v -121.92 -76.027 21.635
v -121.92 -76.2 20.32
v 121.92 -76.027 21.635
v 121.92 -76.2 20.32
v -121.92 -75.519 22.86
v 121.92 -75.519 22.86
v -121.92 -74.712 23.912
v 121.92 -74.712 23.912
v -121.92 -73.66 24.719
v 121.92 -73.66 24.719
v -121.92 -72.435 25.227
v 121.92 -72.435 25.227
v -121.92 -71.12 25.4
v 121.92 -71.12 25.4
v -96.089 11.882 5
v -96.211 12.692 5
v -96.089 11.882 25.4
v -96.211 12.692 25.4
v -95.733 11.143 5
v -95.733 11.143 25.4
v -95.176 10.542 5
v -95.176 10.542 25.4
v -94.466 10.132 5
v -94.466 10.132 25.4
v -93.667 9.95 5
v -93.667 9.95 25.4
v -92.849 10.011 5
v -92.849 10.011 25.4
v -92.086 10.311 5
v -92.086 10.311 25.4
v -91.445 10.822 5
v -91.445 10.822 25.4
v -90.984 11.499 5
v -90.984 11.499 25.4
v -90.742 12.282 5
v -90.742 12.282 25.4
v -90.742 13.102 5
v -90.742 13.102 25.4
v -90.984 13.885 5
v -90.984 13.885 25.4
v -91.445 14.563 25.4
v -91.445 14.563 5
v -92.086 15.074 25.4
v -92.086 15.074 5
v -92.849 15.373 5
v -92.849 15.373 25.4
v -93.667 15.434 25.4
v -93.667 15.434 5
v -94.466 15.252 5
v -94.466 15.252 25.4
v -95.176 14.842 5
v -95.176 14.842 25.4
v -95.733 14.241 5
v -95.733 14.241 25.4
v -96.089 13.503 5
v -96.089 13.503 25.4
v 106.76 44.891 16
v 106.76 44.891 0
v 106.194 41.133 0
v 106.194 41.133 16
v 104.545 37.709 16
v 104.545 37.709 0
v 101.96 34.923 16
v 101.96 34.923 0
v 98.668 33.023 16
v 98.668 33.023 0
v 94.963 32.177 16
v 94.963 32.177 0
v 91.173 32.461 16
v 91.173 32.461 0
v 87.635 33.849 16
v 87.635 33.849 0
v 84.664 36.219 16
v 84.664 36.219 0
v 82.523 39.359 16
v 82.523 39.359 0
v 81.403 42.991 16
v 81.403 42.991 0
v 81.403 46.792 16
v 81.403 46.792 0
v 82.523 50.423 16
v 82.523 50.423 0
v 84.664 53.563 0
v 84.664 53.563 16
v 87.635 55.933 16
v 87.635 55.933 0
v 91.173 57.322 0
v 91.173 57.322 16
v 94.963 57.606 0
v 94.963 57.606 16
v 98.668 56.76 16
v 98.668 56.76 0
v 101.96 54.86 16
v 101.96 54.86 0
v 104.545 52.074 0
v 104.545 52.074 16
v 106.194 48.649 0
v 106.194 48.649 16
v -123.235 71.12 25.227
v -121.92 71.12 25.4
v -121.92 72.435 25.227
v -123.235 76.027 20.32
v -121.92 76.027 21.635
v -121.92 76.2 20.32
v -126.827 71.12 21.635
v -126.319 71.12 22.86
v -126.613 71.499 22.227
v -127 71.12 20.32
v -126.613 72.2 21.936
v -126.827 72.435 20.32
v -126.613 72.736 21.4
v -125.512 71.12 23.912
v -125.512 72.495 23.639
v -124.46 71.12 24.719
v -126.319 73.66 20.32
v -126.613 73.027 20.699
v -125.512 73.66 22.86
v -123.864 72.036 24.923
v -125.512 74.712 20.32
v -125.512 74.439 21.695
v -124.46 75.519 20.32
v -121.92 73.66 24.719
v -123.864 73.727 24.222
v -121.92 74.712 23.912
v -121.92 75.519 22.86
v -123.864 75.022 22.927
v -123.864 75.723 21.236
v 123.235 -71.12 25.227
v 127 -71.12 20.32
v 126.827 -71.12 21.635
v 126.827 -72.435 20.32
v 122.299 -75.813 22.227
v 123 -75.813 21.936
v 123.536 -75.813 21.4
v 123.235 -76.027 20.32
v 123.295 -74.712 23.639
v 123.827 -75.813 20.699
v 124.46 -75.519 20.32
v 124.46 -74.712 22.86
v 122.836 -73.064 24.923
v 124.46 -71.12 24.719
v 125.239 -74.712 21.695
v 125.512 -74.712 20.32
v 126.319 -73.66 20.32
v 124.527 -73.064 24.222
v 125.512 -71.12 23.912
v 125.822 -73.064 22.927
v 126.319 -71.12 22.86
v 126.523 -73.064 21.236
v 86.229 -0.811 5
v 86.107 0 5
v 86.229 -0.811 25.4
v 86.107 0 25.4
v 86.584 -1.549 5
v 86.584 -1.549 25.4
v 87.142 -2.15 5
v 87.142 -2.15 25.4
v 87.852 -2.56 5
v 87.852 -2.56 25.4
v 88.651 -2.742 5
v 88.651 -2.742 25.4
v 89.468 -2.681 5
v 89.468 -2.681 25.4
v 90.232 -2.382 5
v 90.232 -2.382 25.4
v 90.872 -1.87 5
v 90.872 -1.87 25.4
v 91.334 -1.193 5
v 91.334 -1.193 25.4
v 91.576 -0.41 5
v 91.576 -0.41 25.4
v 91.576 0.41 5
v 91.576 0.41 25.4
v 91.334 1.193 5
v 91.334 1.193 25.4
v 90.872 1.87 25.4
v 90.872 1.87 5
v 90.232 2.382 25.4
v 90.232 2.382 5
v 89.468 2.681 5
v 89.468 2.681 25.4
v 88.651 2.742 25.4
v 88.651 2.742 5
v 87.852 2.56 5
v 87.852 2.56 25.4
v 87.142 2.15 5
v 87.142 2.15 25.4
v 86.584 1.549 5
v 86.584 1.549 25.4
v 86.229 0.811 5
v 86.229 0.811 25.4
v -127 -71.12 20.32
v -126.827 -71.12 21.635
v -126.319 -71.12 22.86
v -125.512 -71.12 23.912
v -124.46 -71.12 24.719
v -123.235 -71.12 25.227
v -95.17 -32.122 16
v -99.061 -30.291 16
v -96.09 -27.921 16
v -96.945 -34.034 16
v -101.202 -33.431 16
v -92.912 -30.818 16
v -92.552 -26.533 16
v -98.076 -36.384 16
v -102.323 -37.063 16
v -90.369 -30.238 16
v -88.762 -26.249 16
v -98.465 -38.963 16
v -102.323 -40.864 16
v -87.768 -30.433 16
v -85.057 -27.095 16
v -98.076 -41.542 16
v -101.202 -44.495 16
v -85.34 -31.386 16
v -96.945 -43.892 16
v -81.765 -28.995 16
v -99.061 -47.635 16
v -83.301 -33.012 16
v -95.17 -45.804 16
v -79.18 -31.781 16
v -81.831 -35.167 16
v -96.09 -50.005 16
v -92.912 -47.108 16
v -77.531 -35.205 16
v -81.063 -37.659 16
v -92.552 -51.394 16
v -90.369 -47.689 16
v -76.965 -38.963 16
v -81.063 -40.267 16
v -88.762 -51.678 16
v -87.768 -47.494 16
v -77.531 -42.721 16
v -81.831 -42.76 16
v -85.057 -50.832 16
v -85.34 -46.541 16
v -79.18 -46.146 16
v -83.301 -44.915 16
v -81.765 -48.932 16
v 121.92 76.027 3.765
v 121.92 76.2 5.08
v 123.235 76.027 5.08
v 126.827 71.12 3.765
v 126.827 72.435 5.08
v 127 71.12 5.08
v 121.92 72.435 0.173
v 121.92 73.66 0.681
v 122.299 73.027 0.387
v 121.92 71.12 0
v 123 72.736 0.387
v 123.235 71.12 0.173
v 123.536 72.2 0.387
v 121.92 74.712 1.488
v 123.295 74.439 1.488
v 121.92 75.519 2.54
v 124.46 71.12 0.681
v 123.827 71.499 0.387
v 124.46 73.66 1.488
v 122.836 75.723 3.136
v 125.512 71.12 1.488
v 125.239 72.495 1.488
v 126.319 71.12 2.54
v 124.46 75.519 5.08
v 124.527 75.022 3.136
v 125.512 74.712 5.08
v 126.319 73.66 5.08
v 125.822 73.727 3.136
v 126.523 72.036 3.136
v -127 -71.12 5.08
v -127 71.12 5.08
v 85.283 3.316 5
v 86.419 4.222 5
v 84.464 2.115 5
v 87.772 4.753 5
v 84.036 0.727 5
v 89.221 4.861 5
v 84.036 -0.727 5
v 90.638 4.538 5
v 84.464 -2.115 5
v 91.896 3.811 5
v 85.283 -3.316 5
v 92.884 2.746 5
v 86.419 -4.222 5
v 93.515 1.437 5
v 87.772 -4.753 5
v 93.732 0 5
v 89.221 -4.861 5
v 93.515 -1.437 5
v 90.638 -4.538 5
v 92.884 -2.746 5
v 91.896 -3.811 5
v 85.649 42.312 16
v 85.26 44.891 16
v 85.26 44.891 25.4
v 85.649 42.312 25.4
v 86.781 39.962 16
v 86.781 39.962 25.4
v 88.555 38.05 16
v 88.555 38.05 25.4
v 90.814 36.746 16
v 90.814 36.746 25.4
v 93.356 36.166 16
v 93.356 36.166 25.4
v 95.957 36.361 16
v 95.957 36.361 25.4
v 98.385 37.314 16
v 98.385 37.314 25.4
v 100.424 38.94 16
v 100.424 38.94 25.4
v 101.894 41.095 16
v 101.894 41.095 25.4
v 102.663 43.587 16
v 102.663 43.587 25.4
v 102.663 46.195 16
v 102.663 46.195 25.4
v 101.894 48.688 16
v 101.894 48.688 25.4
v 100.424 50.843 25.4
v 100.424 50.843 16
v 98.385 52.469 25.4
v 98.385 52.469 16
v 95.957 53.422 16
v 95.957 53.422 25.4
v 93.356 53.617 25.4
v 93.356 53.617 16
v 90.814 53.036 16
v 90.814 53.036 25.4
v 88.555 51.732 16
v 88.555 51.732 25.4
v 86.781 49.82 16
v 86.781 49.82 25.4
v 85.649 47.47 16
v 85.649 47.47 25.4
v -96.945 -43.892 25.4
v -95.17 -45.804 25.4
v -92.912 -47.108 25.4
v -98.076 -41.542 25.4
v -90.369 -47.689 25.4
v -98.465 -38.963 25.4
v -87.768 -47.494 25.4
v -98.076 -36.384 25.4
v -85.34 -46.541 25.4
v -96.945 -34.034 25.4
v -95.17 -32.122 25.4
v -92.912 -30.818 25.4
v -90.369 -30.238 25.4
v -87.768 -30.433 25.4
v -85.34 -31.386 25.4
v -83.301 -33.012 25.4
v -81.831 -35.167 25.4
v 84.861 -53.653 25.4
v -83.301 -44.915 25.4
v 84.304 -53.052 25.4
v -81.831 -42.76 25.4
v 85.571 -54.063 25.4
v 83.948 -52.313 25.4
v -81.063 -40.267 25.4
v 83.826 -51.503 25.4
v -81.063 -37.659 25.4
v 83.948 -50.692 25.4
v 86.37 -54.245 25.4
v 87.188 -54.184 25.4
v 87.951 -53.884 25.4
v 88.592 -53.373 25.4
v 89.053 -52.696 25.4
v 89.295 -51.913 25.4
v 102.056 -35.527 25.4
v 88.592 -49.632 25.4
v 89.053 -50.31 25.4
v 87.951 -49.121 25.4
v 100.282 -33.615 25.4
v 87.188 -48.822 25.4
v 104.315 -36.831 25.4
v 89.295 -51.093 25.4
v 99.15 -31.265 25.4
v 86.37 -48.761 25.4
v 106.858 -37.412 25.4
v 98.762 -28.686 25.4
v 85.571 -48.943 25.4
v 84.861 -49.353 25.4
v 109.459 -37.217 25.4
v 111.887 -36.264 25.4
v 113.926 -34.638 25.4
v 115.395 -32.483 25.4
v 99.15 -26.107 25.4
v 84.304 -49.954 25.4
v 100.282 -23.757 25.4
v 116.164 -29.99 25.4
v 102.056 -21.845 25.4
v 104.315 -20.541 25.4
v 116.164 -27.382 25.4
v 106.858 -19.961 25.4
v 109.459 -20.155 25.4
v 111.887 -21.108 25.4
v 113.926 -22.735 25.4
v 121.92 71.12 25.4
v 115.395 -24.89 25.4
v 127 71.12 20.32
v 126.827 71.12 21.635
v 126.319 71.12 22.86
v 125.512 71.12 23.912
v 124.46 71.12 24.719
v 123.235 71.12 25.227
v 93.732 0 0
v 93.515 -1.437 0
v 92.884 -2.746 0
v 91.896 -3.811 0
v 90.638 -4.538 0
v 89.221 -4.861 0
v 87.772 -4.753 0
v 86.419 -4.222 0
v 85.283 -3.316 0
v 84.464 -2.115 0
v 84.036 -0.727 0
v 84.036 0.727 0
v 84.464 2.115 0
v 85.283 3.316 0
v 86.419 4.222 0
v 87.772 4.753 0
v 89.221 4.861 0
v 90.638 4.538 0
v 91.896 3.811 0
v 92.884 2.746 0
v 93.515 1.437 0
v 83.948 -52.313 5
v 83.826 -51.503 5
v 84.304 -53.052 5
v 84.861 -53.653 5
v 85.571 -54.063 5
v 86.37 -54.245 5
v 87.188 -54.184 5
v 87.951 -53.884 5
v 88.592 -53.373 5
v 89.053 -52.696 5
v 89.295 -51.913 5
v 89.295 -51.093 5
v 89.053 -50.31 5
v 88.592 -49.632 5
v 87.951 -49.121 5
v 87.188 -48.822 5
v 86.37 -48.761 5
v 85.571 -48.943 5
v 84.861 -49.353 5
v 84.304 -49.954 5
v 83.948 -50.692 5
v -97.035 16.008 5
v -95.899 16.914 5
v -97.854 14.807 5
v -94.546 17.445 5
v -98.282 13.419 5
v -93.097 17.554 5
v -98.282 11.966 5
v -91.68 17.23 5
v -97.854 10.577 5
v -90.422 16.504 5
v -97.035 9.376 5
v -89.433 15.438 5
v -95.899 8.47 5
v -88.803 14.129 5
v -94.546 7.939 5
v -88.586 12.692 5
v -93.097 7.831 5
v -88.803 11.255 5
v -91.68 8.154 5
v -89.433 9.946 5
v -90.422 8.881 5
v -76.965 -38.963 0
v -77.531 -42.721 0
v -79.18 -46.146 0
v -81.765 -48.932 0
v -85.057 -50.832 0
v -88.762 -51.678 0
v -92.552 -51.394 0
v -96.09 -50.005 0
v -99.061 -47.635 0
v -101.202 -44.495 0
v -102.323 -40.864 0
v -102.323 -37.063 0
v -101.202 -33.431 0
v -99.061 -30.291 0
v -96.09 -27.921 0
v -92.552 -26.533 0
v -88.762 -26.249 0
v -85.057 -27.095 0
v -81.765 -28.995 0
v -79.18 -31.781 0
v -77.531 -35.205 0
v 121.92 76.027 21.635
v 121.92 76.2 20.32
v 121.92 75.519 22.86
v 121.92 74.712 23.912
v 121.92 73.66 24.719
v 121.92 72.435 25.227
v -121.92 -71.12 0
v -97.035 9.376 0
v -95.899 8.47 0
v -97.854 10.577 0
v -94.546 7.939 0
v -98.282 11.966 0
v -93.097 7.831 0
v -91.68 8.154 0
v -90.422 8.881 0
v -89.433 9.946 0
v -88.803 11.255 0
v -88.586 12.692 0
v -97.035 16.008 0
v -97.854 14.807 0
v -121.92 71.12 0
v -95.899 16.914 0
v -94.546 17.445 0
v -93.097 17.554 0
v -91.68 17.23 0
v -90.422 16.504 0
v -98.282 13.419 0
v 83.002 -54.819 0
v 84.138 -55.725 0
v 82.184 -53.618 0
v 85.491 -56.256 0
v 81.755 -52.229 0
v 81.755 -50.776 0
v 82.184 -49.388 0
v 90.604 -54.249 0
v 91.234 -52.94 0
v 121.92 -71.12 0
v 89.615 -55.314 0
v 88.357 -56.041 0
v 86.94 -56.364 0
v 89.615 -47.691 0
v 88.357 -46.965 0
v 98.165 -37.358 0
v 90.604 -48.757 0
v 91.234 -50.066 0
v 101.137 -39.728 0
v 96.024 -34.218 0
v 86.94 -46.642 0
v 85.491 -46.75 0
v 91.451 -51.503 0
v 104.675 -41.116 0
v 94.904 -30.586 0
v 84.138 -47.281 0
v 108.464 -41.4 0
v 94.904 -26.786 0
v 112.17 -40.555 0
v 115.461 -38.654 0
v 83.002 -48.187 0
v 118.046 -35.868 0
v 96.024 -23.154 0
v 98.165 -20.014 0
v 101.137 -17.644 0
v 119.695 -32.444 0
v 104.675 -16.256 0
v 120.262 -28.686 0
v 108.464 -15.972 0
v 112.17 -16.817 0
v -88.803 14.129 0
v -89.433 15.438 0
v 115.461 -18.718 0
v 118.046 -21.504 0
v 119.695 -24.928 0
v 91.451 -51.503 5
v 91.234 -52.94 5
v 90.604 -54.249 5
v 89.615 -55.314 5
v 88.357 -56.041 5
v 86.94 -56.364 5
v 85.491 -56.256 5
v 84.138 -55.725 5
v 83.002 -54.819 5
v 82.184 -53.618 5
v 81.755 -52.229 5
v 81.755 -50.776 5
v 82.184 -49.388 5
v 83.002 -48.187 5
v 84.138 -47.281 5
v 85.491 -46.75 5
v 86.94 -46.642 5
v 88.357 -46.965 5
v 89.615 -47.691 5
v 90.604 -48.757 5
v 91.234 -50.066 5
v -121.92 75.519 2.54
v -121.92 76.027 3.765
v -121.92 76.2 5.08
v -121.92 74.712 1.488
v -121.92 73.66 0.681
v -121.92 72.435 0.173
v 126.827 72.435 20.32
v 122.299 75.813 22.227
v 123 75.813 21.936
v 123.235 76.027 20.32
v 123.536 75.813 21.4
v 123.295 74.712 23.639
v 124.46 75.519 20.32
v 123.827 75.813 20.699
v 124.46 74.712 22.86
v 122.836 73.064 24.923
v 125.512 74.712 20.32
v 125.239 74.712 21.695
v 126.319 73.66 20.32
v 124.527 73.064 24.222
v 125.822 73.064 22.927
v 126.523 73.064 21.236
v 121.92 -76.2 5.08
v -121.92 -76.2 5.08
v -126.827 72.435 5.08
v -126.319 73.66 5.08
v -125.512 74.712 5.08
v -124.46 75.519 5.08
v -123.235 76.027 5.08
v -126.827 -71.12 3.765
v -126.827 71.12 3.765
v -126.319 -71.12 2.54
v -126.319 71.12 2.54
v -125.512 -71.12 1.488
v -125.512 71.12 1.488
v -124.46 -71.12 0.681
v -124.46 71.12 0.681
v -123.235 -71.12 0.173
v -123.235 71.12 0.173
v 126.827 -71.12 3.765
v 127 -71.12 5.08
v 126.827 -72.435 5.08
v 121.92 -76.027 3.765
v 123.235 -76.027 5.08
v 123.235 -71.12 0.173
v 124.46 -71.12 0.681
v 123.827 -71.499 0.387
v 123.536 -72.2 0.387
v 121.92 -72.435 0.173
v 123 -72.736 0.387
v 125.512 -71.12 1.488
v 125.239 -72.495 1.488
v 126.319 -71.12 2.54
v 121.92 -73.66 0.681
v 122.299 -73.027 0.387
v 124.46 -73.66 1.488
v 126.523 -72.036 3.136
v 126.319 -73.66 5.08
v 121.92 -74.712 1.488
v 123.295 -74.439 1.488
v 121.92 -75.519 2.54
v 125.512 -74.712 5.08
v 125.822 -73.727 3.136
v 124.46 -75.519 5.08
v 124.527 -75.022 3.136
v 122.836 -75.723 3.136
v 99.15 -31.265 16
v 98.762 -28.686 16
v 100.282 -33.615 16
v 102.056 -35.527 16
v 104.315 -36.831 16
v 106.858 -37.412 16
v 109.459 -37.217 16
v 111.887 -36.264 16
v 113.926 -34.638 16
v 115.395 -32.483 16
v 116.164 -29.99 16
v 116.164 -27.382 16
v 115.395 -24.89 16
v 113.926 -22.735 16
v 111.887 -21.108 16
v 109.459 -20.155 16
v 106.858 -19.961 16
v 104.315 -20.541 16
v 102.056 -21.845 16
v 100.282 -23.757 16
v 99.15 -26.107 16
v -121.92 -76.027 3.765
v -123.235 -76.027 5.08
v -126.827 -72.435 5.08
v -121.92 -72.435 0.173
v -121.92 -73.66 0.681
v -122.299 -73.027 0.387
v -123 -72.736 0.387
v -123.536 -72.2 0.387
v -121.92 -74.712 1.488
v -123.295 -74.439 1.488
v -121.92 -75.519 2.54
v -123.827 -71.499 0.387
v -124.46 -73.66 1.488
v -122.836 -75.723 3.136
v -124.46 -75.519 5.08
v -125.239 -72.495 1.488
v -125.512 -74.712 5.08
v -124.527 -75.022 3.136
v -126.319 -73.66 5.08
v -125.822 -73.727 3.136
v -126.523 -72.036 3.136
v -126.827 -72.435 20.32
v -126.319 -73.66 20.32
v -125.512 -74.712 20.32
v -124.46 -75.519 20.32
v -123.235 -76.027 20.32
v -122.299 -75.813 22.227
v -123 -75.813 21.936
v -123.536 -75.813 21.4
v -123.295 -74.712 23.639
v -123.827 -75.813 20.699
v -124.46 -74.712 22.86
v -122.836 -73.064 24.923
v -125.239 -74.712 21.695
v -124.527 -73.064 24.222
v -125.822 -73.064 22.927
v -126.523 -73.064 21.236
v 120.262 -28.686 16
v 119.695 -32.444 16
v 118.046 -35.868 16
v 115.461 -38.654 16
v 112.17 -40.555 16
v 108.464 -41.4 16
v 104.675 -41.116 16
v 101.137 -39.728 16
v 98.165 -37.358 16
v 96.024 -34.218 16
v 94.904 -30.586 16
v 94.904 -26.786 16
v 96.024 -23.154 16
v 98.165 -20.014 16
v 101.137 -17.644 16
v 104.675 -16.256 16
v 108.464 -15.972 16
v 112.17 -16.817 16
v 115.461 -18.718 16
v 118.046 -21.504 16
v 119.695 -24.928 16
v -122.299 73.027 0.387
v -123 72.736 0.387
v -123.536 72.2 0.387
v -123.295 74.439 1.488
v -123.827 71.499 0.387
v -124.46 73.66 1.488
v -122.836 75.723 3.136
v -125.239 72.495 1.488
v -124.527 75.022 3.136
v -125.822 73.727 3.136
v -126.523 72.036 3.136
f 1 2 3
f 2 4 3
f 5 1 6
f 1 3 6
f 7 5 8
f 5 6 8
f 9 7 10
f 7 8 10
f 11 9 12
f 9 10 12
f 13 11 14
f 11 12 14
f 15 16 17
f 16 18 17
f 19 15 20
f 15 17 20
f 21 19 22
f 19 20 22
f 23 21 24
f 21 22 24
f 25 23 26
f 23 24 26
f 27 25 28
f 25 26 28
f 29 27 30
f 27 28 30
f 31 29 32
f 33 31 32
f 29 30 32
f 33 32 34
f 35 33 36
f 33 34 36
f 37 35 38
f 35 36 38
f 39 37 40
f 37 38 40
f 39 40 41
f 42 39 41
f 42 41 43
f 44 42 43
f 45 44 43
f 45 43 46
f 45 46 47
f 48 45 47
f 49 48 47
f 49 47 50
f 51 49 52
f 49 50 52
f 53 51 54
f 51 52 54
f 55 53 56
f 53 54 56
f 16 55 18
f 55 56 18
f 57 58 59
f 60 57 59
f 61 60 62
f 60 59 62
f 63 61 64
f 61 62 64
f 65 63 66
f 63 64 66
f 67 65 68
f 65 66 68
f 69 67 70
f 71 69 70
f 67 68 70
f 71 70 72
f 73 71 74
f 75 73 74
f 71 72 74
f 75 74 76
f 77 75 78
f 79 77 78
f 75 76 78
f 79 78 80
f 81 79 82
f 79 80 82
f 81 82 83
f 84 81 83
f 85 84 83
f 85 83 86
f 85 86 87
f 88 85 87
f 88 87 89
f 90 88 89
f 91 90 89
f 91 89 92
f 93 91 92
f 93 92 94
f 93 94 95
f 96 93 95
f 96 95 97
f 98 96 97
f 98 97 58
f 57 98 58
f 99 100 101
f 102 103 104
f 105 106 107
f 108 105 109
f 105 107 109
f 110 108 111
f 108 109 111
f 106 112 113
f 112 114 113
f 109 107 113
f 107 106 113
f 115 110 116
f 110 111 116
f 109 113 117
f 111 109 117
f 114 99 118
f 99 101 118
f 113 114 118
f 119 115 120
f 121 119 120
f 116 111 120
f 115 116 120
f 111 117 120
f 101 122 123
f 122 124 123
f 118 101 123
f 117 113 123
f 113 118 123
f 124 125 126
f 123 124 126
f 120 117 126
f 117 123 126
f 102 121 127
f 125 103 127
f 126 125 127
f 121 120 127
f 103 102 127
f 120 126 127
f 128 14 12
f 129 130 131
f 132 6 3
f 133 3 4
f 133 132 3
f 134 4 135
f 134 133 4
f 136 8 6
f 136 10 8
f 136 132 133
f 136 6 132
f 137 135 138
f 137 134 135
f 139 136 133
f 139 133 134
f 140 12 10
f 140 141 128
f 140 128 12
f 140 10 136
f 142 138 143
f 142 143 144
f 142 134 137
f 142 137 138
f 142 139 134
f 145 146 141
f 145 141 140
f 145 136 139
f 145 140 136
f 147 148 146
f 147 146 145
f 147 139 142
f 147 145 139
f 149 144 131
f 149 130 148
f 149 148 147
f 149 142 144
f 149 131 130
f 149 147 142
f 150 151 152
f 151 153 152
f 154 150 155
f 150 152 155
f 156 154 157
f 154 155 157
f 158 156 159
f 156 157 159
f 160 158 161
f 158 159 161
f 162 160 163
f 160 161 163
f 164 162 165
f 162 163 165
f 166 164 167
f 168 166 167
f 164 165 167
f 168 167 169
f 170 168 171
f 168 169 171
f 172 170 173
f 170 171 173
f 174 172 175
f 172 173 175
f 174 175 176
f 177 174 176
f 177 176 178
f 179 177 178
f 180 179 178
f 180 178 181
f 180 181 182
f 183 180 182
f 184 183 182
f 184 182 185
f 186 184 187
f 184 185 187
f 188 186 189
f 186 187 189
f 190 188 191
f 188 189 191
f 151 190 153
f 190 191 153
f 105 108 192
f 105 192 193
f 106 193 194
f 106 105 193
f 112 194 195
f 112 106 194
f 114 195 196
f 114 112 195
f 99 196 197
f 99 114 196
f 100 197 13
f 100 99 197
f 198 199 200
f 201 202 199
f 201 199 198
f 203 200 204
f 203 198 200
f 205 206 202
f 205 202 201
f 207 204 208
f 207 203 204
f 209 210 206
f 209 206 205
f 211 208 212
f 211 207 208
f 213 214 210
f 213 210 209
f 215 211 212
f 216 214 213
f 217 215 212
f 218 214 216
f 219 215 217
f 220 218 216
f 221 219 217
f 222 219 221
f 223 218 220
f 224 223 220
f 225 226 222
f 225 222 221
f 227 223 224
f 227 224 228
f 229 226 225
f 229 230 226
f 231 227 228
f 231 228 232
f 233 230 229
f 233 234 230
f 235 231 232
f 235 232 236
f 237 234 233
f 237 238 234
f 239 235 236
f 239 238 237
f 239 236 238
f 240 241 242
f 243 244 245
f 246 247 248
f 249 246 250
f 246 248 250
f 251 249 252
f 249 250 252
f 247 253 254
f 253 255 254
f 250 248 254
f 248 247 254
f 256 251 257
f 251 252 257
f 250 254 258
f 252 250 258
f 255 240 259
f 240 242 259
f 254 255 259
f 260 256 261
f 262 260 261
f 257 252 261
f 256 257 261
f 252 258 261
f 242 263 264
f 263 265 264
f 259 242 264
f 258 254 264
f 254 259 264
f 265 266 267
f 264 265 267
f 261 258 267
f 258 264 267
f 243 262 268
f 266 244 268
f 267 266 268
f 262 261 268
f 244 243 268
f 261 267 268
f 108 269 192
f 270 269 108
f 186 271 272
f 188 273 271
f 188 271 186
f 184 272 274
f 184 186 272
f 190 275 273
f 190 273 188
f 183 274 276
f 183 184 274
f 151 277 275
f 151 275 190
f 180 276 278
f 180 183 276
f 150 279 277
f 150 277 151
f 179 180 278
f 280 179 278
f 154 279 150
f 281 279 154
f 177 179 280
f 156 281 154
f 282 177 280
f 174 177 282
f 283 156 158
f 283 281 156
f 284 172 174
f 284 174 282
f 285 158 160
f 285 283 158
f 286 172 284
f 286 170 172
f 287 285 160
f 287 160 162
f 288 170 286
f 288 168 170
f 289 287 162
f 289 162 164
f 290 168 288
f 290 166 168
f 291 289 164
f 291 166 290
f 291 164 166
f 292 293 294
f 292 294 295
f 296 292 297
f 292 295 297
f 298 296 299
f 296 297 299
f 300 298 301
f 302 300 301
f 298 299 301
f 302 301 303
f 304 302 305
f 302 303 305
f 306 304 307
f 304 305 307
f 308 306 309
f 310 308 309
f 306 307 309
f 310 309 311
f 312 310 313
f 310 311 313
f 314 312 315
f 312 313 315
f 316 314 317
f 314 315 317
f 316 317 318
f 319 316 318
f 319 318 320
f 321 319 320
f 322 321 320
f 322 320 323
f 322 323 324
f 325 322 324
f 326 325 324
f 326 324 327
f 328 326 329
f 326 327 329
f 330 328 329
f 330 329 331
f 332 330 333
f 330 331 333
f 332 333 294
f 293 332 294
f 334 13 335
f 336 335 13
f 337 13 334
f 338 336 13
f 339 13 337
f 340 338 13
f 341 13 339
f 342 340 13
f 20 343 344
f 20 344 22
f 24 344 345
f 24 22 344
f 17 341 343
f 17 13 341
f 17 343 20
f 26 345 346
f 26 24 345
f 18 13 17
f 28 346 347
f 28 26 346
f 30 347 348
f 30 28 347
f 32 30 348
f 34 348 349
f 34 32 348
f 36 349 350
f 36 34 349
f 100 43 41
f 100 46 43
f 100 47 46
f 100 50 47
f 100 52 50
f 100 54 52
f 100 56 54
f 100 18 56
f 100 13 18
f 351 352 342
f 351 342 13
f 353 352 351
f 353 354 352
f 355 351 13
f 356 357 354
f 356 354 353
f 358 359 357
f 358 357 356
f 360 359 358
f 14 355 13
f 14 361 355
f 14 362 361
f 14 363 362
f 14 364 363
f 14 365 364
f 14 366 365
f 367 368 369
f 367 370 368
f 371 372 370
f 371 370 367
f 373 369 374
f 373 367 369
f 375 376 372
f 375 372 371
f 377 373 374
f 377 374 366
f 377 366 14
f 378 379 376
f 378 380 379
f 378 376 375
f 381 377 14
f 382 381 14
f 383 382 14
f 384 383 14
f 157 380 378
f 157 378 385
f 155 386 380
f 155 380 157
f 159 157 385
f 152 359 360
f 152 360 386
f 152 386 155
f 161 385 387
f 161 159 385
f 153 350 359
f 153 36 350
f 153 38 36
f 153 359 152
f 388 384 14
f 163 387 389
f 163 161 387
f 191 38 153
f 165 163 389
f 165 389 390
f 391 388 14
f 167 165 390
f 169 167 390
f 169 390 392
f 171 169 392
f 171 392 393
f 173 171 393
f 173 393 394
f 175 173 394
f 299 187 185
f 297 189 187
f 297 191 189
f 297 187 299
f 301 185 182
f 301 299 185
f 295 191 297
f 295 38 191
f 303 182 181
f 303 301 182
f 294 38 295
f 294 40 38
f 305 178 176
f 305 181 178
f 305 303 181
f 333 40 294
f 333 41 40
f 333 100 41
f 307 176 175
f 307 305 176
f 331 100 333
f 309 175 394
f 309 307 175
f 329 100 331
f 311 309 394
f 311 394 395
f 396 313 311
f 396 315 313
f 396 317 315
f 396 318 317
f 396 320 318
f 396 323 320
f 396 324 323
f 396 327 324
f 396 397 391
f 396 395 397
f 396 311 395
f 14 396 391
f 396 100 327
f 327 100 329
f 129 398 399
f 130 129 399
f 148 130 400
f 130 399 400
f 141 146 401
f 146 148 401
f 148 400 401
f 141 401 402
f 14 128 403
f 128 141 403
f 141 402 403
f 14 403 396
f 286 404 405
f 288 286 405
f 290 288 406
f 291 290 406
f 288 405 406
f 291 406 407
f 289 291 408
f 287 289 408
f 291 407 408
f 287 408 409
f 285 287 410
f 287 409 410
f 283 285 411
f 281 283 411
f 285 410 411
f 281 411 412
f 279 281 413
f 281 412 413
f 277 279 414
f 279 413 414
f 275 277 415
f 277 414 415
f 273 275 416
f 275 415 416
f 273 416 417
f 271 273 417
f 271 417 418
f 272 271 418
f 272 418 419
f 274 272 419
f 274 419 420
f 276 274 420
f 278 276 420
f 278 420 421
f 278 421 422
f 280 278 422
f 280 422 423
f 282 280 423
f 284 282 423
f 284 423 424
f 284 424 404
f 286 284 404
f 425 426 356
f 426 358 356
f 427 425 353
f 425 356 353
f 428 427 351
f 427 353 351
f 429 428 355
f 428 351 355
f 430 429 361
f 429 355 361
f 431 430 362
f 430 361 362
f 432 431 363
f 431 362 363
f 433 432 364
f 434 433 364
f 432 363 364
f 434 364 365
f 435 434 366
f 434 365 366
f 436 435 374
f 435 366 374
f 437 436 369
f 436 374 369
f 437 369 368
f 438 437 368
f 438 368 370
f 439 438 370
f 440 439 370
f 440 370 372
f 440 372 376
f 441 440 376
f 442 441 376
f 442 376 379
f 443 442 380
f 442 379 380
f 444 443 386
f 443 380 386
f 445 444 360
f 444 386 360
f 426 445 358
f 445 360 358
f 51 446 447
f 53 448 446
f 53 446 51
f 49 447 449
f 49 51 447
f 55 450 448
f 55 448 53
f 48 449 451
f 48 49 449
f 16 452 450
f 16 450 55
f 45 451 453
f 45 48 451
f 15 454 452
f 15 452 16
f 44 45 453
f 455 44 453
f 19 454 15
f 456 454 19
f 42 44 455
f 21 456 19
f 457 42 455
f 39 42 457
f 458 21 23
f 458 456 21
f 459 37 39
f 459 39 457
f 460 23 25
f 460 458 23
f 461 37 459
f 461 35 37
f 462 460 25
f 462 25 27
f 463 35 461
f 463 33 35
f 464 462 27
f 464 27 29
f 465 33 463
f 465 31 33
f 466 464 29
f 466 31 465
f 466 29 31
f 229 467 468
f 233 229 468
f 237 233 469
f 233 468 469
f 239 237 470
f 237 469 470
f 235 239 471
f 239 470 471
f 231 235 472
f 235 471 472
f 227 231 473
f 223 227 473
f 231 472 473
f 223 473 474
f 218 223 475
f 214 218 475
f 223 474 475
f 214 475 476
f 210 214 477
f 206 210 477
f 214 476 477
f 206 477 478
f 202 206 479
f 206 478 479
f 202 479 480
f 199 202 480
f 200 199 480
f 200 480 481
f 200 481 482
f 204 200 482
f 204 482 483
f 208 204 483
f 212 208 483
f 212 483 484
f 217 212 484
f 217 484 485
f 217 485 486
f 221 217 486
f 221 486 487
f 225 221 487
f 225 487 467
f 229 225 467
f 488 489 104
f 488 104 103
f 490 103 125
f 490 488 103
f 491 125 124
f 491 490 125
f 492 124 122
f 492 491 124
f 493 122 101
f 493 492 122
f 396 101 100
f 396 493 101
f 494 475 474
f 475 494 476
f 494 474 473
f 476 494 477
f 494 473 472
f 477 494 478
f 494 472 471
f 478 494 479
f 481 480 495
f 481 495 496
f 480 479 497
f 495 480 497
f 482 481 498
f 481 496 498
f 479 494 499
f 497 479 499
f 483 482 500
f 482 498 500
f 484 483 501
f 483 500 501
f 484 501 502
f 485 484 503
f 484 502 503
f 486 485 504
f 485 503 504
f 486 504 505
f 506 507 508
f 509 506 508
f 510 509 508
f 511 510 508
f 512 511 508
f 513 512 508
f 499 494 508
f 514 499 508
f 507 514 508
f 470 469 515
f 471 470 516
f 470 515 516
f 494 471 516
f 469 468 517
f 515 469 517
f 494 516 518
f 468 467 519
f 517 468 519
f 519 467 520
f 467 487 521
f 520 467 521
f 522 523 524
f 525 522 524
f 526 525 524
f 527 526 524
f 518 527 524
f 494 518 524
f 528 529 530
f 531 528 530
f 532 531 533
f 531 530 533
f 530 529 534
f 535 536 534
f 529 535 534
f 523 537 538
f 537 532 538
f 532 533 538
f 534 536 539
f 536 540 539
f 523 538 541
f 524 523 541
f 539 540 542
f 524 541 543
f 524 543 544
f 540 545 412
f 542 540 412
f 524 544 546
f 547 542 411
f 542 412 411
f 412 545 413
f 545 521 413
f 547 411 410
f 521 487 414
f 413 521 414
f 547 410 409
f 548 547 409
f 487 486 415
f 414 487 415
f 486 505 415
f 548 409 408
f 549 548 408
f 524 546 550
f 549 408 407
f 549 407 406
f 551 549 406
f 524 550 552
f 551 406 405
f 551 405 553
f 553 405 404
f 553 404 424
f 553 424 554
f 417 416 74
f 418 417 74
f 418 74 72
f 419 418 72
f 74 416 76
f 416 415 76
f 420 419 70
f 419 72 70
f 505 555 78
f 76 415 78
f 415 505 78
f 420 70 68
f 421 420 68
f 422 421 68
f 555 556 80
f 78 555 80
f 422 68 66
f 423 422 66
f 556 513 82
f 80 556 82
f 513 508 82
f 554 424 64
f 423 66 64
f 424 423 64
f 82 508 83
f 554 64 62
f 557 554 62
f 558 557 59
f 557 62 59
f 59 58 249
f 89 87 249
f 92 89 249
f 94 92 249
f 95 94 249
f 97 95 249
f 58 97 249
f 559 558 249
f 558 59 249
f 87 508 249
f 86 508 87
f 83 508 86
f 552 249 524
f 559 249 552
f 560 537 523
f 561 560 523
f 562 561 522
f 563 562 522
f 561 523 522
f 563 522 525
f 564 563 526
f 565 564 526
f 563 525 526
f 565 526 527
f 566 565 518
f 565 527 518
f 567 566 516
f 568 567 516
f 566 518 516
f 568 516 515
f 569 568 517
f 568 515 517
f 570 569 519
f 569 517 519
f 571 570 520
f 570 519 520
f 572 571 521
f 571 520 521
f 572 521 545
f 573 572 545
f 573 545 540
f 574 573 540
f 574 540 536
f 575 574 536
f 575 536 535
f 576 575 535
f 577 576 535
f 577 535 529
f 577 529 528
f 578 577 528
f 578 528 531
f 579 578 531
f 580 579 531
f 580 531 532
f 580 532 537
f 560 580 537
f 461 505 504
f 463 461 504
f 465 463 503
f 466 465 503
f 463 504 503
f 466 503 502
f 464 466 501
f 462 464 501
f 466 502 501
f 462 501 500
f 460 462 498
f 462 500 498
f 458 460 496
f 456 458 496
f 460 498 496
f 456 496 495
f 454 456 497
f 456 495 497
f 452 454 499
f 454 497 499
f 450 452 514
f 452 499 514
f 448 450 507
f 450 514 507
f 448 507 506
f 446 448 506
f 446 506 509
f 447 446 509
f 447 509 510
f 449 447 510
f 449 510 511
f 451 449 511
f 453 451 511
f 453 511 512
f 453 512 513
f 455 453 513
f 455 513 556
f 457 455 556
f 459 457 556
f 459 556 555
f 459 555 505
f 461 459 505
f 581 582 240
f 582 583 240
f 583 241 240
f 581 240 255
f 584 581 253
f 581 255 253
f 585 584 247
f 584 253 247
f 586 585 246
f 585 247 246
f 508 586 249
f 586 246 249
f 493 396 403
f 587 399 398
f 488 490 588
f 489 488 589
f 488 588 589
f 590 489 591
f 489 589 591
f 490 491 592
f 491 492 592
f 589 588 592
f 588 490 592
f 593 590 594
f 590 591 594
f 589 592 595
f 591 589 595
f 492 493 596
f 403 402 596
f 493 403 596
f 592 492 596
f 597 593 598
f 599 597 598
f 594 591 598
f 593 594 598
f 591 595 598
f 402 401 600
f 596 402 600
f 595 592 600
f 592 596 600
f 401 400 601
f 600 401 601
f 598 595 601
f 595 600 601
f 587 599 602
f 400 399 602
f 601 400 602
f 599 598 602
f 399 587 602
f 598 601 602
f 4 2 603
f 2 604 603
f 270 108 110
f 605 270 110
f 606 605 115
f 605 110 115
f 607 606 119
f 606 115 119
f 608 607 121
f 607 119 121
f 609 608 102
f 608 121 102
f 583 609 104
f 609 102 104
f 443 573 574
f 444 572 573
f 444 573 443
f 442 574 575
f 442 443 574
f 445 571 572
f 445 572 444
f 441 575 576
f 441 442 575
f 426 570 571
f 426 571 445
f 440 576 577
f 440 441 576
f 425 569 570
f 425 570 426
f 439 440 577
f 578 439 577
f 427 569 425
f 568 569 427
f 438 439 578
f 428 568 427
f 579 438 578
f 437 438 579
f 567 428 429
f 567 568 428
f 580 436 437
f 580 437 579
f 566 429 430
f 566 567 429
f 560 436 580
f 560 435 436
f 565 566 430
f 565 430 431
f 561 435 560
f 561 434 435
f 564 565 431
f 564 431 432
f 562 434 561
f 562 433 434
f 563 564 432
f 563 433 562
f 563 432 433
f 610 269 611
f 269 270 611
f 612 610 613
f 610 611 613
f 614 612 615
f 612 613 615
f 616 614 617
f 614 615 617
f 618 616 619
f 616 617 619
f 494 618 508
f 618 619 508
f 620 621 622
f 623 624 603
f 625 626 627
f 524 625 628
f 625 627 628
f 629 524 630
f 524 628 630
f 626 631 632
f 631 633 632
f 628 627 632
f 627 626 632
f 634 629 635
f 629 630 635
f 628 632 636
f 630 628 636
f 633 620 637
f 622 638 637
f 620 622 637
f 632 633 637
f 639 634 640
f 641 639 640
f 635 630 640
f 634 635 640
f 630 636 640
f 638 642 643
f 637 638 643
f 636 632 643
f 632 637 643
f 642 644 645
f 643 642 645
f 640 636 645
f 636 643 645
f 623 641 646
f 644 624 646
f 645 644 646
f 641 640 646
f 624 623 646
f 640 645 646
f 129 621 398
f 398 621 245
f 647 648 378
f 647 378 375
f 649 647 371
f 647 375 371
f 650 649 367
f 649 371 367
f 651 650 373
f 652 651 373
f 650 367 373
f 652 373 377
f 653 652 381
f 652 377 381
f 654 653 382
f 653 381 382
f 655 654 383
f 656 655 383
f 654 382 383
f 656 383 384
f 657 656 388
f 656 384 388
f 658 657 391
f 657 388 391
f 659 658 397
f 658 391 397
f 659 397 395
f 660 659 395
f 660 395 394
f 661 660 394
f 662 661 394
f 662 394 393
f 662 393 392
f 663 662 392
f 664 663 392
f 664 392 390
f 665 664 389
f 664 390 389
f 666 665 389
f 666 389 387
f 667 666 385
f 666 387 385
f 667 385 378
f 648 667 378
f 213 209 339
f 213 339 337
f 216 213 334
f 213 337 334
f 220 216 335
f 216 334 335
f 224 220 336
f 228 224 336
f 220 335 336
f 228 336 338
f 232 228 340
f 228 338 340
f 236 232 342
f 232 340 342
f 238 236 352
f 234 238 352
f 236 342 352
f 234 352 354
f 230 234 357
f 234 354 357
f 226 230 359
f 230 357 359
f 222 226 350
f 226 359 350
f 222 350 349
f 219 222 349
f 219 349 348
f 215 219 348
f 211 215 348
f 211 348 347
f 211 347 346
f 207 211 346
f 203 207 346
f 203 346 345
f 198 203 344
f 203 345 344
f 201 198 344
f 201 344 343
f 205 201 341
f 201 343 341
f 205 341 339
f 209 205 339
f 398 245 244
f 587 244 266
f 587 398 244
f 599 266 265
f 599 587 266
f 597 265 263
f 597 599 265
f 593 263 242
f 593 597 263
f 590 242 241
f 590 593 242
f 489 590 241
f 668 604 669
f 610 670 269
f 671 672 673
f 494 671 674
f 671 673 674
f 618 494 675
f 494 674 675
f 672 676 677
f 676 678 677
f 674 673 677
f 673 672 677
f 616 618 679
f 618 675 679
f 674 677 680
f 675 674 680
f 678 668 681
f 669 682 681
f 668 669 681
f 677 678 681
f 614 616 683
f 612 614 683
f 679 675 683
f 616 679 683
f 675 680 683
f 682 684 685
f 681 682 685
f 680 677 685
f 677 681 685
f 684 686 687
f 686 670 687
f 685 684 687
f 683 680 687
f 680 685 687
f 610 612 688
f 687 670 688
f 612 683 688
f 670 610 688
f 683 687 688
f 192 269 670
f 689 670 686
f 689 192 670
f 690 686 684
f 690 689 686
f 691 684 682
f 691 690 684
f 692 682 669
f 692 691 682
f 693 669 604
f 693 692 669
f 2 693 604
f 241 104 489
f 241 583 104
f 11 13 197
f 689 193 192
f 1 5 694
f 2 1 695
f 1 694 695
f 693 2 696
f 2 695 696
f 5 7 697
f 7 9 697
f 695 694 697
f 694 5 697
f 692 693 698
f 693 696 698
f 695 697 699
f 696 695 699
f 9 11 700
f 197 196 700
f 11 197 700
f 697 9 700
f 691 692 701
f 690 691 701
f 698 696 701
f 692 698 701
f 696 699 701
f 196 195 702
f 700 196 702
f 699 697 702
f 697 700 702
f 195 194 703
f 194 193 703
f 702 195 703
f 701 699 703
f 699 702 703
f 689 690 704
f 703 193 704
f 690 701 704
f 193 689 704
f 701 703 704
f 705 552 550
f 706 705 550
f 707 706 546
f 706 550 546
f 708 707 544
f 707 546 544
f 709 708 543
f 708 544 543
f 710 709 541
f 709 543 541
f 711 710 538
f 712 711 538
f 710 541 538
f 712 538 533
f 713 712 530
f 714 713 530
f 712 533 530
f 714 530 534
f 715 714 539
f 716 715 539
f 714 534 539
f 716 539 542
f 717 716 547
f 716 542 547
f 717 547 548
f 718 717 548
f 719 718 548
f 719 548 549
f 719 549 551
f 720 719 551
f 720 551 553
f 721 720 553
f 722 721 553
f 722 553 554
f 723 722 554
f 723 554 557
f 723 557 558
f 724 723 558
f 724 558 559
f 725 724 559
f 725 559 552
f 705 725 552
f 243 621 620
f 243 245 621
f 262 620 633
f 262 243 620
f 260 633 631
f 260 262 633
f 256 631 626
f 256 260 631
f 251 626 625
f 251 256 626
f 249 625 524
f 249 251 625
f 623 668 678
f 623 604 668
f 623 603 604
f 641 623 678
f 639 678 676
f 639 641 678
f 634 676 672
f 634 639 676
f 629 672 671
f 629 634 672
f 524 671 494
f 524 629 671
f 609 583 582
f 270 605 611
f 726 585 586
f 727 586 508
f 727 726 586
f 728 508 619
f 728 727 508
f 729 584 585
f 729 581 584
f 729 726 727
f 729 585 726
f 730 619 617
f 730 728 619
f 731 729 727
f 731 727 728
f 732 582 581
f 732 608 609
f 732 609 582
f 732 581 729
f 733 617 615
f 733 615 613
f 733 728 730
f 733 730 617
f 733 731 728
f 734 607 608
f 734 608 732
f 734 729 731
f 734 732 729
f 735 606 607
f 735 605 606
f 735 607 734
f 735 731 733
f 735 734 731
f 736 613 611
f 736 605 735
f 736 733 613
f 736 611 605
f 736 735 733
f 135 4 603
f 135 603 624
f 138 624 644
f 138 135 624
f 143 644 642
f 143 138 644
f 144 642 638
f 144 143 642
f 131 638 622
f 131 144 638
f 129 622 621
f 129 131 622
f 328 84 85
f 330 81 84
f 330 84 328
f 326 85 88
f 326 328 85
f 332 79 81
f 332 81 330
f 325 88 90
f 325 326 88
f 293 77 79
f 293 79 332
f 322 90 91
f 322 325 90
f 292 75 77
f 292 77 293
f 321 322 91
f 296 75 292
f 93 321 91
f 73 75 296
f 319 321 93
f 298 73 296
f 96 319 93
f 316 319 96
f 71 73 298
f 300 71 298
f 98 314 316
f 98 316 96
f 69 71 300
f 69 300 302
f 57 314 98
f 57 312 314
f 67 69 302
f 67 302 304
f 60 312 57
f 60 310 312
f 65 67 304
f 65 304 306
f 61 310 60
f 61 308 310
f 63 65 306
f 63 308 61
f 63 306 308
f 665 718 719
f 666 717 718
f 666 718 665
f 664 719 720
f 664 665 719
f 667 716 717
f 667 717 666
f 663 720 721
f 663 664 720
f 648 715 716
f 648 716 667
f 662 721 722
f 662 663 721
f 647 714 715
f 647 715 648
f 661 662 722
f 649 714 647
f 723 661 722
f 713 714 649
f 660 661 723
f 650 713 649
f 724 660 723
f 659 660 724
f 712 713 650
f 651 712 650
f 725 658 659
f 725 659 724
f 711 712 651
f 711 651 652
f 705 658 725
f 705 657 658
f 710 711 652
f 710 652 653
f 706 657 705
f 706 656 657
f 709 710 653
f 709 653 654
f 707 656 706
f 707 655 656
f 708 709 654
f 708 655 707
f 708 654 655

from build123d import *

# Parameters (mm, degrees)
F0_W           = 254
F0_H           = 152.4
F1_DEPTH       = 25.4
F2_R           = 5.08
F4_D           = 17.5
F4_CBORE_D     = 25.5
F4_CBORE_DEPTH = 16
F6_D           = 5.5
F6_CBORE_D     = 9.75
F6_CBORE_DEPTH = 5


with BuildPart() as f1:
    # F0 (on Top) → F1 (new body)
    with BuildSketch(Plane.XY):
        Rectangle(F0_W, F0_H)
    extrude(amount=F1_DEPTH)

    # F2
    f2_edges = [f1.edges().sort_by_distance(p)[0] for p in [
        (127, 0, 25.4),
        (0, 76.2, 25.4),
        (-127, 0, 25.4),
        (0, -76.2, 25.4),
        (127, 76.2, 12.7),
        (-127, 76.2, 12.7),
        (0, 76.2, 0),
        (127, -76.2, 12.7),
        (127, 0, 0),
        (-127, -76.2, 12.7),
        (0, -76.2, 0),
        (-127, 0, 0),
    ]]
    fillet(f2_edges, radius=F2_R)

    # F4 (through all)
    with Locations(Plane(origin=(0, 0, 0), x_dir=(1, 0, 0), z_dir=(0, 0, -1))):
        with Locations((107.5116768479, 28.6860521883), (94.0102785826, -44.8912791908), (-89.7149518132, 38.9632694423)):
            CounterBoreHole(F4_D / 2, F4_CBORE_D / 2, F4_CBORE_DEPTH)

    # F6 (through all)
    with Locations(Plane(origin=(0, 0, 0), x_dir=(1, 0, 0), z_dir=(0, 0, -1))):
        with Locations((-93.461304903, -12.6921338961), (88.8565033674, 0), (86.5757465363, 51.5028946102)):
            CounterBoreHole(F6_D / 2, F6_CBORE_D / 2, F6_CBORE_DEPTH)


solid = f1.part
